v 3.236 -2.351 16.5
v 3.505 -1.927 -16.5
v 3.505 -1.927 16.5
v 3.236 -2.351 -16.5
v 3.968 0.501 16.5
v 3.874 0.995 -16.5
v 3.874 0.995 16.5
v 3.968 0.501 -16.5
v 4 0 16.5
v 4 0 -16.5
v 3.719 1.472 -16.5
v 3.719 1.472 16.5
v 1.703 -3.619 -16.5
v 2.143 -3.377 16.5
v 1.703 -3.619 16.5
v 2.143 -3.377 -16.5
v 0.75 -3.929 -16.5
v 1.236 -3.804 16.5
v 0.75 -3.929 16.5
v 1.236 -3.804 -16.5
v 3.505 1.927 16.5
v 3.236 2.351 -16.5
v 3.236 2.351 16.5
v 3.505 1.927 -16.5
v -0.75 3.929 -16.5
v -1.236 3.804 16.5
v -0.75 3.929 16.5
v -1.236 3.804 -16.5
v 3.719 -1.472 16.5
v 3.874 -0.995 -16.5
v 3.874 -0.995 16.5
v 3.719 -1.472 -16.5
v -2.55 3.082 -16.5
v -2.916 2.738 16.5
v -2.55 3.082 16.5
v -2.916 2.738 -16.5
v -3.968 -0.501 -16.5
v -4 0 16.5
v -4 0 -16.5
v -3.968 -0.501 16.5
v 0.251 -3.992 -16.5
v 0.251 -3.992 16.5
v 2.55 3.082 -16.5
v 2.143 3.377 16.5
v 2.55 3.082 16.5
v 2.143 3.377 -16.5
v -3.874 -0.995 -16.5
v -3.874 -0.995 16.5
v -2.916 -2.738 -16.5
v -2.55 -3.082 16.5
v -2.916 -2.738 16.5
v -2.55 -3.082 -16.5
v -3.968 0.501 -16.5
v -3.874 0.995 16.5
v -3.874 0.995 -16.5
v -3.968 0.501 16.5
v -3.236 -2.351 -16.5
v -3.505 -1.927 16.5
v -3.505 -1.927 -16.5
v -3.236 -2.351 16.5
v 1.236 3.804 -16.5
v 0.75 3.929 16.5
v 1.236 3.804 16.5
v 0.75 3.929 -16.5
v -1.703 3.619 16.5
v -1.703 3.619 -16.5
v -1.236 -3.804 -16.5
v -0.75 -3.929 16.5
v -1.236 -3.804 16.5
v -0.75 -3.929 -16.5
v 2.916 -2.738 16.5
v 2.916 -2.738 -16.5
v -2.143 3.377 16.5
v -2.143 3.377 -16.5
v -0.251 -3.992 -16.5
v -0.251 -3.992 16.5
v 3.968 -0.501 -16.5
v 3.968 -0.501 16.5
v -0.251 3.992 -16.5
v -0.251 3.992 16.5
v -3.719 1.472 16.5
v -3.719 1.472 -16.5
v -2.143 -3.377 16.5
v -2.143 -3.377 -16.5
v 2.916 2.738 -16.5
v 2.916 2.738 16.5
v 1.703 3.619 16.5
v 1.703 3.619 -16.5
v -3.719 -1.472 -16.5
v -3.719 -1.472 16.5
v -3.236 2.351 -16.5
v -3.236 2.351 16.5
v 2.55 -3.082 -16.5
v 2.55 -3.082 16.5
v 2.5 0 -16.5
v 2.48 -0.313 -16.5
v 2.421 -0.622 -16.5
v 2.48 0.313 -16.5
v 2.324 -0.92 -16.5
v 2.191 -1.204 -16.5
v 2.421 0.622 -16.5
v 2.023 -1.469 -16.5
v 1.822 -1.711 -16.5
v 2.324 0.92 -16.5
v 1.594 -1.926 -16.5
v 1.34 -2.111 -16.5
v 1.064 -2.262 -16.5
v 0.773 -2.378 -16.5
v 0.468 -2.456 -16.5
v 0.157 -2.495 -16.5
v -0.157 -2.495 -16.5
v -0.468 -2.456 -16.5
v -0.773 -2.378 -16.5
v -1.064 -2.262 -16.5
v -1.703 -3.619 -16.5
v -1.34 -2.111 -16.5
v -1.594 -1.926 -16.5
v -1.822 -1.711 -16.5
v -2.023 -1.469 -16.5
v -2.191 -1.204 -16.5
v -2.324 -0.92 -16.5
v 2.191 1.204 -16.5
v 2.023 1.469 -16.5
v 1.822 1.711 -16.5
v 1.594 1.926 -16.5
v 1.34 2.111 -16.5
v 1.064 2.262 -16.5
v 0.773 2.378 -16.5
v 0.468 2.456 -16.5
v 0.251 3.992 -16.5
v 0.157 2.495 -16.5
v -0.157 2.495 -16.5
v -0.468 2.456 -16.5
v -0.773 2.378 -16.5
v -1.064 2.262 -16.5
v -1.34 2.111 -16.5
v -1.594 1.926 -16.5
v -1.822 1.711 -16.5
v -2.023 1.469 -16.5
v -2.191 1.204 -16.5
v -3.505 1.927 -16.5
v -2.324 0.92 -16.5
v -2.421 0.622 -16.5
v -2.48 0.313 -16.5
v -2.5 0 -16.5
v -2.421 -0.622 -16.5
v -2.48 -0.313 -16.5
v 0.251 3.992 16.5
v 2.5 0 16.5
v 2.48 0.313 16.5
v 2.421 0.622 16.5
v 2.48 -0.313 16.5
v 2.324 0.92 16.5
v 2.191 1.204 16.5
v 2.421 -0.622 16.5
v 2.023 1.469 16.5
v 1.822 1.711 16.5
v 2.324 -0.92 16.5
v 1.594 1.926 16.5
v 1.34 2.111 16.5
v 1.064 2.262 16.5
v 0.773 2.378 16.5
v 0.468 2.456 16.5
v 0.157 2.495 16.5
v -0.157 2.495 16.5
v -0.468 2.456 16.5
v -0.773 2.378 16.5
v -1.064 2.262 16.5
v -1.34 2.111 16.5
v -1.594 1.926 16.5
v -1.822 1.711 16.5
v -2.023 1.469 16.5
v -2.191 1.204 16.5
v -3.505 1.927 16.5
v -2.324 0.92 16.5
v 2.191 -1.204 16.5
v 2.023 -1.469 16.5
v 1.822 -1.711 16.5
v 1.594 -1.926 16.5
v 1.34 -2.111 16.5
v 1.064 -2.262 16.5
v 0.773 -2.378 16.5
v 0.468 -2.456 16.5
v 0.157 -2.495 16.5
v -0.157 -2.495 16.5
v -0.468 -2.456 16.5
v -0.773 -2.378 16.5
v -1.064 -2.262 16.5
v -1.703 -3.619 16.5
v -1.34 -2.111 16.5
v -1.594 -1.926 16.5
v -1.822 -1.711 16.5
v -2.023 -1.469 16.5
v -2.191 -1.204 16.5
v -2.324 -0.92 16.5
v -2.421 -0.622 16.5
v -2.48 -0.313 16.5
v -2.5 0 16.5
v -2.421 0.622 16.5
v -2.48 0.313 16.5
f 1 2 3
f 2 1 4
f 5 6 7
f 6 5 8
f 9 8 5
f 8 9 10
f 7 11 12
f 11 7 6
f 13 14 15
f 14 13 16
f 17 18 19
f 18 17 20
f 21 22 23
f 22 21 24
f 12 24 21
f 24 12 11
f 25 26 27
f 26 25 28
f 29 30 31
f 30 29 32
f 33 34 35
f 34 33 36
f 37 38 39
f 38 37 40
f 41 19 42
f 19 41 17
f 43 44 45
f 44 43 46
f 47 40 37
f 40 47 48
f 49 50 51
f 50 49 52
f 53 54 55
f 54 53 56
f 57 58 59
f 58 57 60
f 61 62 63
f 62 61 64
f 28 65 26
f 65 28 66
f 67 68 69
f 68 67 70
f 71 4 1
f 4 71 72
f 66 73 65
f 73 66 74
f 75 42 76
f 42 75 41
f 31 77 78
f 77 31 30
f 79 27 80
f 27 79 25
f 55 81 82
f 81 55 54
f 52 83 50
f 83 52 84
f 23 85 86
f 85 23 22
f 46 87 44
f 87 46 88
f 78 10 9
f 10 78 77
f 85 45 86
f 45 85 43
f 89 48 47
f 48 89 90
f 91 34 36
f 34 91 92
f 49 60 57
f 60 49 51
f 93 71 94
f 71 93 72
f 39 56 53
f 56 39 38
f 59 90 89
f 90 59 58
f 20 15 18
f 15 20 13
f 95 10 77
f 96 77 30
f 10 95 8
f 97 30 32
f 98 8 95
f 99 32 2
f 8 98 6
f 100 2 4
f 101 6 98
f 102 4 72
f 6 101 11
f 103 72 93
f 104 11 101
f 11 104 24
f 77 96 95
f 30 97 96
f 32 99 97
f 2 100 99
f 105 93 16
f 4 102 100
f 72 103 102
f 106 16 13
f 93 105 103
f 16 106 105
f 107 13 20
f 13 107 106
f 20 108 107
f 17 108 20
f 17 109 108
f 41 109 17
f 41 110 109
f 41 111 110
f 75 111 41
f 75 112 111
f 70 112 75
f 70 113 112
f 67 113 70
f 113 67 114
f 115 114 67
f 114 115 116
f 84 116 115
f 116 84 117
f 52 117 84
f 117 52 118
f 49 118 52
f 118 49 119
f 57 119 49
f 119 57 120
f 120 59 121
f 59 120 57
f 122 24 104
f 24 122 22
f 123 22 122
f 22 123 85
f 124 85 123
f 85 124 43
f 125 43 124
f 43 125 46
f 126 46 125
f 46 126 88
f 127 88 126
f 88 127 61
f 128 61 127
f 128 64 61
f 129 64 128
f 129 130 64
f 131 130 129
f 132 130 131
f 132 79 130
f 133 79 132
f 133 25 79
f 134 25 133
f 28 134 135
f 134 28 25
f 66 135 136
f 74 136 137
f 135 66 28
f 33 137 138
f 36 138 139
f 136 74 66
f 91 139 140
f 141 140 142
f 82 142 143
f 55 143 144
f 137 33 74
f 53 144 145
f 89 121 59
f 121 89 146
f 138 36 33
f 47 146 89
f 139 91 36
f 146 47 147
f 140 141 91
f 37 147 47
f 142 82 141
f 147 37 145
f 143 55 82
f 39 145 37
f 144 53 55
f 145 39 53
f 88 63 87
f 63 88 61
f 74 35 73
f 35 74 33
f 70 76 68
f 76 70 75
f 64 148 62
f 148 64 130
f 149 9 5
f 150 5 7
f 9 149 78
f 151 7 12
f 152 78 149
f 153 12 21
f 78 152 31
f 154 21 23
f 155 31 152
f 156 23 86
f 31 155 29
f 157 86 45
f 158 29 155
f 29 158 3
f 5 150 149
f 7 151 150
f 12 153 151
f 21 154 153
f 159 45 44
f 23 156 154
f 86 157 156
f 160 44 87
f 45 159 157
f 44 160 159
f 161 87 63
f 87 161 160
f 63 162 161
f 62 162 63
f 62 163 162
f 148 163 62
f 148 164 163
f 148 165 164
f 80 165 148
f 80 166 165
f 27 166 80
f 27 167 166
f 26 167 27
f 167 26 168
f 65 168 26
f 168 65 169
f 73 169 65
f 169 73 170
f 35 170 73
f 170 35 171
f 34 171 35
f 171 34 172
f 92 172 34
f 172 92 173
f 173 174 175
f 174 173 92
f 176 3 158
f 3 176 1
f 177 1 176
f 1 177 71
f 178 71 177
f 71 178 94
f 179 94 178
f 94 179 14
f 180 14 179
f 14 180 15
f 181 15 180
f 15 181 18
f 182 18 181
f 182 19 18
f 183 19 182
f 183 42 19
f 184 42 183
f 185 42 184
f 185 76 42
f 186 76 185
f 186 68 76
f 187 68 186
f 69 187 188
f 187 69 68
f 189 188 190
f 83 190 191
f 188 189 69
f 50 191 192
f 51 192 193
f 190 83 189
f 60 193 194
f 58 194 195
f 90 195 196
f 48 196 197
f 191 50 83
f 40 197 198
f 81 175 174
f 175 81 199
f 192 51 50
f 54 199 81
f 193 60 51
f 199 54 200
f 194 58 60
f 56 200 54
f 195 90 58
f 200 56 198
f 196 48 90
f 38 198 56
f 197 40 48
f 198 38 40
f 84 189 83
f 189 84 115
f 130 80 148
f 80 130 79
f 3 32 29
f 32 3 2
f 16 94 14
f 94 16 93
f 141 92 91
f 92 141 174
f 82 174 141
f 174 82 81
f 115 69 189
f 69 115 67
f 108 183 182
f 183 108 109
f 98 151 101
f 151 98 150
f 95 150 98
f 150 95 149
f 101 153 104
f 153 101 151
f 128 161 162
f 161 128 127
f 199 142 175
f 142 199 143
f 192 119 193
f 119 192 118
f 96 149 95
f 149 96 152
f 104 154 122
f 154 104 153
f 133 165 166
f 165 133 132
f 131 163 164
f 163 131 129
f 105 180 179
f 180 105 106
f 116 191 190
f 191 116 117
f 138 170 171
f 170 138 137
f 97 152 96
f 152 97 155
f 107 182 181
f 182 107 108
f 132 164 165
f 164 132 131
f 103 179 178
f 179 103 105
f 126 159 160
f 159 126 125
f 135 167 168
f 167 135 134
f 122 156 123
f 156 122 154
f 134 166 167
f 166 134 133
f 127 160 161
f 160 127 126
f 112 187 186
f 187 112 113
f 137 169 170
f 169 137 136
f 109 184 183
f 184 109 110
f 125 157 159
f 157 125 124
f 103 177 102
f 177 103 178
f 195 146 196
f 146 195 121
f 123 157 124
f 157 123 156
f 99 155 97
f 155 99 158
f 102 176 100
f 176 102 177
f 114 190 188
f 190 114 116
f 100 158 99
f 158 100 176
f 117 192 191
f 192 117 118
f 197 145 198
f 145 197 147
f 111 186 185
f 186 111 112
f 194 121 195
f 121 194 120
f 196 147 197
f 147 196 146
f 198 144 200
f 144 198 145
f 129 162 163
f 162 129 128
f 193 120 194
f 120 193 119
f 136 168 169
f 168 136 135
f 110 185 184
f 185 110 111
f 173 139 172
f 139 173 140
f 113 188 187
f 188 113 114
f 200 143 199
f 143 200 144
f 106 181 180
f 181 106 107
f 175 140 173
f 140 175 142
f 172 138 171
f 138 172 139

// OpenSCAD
$fn = 50;


difference() {
	union() {
		translate(v = [0, 0, -16.5000000000]) {
			cylinder(h = 33, r = 4.0000000000);
		}
	}
	union() {
		translate(v = [0, 0, -100.0000000000]) {
			cylinder(h = 200, r = 2.5000000000);
		}
	}
}
